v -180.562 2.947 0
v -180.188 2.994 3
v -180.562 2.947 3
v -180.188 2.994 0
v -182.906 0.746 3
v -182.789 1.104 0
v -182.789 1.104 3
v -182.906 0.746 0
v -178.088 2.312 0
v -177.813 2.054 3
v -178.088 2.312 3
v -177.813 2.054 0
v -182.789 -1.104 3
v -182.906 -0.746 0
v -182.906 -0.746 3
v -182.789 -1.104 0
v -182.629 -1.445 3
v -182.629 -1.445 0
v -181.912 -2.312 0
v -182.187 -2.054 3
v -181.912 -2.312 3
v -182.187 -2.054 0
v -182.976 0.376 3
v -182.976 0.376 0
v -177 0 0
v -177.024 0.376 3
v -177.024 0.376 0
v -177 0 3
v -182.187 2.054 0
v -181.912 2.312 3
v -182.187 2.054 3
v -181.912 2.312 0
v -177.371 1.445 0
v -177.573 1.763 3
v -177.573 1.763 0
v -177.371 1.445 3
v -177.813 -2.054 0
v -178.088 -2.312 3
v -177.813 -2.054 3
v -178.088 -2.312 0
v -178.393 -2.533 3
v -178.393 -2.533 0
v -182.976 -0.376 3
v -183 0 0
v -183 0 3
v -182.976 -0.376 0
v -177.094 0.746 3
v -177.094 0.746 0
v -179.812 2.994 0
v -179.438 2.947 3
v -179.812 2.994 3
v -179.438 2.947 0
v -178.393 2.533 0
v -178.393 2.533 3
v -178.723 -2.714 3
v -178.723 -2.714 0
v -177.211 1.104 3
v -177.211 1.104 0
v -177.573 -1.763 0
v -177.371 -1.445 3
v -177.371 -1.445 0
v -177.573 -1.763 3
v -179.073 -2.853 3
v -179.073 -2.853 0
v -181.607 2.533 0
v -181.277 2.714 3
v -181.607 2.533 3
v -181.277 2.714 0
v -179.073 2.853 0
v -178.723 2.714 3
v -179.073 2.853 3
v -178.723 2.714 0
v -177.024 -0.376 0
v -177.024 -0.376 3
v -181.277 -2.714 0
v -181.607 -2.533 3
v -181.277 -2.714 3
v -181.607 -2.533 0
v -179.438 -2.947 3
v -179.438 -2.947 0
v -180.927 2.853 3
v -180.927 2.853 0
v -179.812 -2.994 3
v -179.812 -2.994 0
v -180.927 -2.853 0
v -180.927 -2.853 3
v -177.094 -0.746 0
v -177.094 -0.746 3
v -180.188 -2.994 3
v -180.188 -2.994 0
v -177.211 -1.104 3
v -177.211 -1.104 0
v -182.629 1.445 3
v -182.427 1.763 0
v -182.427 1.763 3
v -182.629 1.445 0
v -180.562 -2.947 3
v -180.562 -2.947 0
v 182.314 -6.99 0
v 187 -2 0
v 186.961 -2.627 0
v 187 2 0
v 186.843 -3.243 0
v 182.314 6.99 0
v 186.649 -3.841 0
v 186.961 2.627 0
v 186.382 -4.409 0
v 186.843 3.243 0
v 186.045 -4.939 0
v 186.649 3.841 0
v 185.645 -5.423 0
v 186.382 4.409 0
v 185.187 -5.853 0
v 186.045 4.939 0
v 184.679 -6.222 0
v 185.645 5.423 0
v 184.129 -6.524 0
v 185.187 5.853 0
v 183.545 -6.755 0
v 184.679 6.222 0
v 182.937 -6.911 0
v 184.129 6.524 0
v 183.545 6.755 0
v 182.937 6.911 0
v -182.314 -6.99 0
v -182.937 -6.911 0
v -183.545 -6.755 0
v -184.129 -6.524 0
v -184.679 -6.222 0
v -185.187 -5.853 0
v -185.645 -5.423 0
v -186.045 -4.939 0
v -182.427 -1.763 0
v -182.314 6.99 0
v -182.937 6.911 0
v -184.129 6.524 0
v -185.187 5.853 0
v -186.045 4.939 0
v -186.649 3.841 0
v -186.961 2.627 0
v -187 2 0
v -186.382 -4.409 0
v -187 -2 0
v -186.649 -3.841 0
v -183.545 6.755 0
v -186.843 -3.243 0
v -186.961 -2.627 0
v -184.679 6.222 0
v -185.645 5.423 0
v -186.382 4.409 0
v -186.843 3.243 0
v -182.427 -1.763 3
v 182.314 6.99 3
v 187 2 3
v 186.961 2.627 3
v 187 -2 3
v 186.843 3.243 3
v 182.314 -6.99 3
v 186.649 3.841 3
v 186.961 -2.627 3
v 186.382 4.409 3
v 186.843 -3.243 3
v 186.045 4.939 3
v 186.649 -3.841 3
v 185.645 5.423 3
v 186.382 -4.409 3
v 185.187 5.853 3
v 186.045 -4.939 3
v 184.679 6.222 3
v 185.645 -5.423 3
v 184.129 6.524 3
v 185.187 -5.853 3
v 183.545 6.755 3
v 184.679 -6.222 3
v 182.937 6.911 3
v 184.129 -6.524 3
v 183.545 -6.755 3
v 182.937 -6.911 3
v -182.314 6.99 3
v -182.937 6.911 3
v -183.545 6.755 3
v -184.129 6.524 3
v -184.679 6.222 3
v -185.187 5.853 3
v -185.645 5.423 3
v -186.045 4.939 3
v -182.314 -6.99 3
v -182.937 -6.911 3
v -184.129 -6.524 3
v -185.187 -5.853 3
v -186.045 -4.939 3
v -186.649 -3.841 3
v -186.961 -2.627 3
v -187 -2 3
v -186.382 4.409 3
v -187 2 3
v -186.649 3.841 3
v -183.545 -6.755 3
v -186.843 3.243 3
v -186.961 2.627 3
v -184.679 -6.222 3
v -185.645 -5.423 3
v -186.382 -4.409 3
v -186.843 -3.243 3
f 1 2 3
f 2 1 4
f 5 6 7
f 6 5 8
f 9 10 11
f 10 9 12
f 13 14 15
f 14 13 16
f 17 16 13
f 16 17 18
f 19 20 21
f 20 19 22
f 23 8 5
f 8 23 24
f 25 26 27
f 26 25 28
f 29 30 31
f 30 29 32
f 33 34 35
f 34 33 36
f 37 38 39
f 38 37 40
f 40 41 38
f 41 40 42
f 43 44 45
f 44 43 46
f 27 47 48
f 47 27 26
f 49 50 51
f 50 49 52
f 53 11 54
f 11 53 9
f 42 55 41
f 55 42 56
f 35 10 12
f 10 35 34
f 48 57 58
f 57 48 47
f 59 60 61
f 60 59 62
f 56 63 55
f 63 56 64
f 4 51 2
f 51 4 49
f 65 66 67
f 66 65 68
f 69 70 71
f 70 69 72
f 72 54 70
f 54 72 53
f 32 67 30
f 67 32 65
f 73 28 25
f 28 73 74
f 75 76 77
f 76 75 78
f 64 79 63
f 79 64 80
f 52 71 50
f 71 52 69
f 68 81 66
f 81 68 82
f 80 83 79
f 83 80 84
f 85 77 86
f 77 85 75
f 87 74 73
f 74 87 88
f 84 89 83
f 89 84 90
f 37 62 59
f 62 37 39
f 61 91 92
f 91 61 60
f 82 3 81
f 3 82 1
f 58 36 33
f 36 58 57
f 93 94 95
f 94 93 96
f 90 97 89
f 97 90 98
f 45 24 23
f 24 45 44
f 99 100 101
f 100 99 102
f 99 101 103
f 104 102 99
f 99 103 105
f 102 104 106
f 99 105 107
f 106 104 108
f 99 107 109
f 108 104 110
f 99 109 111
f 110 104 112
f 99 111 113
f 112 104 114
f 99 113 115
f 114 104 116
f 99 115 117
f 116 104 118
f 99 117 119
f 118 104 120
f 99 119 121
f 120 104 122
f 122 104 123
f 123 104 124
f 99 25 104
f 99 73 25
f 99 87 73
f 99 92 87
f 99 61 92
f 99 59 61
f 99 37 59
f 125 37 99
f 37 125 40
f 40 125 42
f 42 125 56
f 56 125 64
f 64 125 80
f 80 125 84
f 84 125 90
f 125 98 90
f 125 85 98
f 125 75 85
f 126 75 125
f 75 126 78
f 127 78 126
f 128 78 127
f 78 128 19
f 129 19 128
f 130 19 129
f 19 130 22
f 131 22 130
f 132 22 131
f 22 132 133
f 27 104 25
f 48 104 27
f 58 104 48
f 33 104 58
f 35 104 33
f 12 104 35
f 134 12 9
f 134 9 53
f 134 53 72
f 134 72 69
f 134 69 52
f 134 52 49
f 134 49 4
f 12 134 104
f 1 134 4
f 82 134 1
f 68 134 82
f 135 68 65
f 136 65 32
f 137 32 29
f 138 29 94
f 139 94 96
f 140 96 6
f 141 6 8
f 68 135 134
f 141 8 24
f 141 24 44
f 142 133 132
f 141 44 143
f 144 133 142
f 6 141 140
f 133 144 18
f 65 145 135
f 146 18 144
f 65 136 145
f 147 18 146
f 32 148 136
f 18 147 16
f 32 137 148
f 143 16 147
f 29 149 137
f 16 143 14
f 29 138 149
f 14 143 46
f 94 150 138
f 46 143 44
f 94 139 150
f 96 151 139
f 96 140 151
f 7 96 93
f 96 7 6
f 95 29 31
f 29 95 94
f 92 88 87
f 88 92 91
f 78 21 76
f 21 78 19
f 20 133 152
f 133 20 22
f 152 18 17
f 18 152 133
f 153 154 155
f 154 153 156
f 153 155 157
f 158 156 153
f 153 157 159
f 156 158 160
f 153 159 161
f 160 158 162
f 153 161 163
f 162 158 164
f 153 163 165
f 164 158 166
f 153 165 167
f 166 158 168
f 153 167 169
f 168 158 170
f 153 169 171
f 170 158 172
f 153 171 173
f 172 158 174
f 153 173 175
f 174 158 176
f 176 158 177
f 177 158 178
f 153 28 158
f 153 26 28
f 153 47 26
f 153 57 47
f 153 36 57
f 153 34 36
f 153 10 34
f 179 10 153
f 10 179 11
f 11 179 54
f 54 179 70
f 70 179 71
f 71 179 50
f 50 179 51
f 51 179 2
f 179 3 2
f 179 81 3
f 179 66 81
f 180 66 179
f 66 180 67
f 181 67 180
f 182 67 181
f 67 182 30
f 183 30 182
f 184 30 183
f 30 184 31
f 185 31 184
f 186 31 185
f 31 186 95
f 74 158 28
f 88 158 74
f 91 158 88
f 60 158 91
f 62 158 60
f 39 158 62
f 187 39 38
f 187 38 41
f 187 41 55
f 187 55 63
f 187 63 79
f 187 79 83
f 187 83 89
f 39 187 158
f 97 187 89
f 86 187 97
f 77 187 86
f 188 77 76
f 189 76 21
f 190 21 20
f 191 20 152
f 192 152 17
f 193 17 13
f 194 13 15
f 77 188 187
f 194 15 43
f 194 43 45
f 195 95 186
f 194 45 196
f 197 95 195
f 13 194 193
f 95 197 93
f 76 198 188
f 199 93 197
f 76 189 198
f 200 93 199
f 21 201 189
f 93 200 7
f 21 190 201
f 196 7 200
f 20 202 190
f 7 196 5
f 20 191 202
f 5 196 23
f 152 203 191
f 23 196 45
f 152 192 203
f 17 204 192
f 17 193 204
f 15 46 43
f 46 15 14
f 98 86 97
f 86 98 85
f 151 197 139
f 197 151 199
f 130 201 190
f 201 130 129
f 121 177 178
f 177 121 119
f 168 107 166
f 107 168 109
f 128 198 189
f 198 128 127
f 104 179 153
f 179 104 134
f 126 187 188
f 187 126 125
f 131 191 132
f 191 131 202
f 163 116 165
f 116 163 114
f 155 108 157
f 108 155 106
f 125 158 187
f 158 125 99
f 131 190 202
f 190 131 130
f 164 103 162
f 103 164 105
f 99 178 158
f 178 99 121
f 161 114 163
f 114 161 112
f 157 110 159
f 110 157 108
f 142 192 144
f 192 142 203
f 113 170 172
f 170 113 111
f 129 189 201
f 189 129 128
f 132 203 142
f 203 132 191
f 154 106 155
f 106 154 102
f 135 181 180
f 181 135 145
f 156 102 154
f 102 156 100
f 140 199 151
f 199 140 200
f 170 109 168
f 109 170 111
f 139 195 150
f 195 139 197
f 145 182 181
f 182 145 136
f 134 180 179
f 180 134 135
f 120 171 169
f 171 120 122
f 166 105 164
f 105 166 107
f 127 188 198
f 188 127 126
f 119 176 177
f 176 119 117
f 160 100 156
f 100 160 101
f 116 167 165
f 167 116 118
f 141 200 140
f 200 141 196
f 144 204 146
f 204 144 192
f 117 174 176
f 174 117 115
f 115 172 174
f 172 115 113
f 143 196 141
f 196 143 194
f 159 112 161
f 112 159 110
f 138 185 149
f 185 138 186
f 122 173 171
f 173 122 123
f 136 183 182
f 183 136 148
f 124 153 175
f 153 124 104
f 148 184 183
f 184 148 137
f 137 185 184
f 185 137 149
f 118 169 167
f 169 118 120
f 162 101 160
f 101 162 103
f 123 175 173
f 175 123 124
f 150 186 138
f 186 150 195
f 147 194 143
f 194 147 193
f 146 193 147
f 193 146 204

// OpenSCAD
$fn = 50;


difference() {
	union() {
		hull() {
			translate(v = [-182.0000000000, 2.0000000000, 0]) {
				cylinder(h = 3, r = 5);
			}
			translate(v = [182.0000000000, 2.0000000000, 0]) {
				cylinder(h = 3, r = 5);
			}
			translate(v = [-182.0000000000, -2.0000000000, 0]) {
				cylinder(h = 3, r = 5);
			}
			translate(v = [182.0000000000, -2.0000000000, 0]) {
				cylinder(h = 3, r = 5);
			}
		}
	}
	union() {
		translate(v = [-180.0000000000, 0.0000000000, 0]) {
			cylinder(h = 3, r = 3.0000000000);
		}
		translate(v = [-180.0000000000, 0.0000000000, 0]) {
			cylinder(h = 3, r = 1.5000000000);
		}
		translate(v = [-180.0000000000, 0.0000000000, 0]) {
			cylinder(h = 3, r = 1.5000000000);
		}
		translate(v = [-180.0000000000, 0.0000000000, 0]) {
			cylinder(h = 3, r = 1.5000000000);
		}
	}
}
